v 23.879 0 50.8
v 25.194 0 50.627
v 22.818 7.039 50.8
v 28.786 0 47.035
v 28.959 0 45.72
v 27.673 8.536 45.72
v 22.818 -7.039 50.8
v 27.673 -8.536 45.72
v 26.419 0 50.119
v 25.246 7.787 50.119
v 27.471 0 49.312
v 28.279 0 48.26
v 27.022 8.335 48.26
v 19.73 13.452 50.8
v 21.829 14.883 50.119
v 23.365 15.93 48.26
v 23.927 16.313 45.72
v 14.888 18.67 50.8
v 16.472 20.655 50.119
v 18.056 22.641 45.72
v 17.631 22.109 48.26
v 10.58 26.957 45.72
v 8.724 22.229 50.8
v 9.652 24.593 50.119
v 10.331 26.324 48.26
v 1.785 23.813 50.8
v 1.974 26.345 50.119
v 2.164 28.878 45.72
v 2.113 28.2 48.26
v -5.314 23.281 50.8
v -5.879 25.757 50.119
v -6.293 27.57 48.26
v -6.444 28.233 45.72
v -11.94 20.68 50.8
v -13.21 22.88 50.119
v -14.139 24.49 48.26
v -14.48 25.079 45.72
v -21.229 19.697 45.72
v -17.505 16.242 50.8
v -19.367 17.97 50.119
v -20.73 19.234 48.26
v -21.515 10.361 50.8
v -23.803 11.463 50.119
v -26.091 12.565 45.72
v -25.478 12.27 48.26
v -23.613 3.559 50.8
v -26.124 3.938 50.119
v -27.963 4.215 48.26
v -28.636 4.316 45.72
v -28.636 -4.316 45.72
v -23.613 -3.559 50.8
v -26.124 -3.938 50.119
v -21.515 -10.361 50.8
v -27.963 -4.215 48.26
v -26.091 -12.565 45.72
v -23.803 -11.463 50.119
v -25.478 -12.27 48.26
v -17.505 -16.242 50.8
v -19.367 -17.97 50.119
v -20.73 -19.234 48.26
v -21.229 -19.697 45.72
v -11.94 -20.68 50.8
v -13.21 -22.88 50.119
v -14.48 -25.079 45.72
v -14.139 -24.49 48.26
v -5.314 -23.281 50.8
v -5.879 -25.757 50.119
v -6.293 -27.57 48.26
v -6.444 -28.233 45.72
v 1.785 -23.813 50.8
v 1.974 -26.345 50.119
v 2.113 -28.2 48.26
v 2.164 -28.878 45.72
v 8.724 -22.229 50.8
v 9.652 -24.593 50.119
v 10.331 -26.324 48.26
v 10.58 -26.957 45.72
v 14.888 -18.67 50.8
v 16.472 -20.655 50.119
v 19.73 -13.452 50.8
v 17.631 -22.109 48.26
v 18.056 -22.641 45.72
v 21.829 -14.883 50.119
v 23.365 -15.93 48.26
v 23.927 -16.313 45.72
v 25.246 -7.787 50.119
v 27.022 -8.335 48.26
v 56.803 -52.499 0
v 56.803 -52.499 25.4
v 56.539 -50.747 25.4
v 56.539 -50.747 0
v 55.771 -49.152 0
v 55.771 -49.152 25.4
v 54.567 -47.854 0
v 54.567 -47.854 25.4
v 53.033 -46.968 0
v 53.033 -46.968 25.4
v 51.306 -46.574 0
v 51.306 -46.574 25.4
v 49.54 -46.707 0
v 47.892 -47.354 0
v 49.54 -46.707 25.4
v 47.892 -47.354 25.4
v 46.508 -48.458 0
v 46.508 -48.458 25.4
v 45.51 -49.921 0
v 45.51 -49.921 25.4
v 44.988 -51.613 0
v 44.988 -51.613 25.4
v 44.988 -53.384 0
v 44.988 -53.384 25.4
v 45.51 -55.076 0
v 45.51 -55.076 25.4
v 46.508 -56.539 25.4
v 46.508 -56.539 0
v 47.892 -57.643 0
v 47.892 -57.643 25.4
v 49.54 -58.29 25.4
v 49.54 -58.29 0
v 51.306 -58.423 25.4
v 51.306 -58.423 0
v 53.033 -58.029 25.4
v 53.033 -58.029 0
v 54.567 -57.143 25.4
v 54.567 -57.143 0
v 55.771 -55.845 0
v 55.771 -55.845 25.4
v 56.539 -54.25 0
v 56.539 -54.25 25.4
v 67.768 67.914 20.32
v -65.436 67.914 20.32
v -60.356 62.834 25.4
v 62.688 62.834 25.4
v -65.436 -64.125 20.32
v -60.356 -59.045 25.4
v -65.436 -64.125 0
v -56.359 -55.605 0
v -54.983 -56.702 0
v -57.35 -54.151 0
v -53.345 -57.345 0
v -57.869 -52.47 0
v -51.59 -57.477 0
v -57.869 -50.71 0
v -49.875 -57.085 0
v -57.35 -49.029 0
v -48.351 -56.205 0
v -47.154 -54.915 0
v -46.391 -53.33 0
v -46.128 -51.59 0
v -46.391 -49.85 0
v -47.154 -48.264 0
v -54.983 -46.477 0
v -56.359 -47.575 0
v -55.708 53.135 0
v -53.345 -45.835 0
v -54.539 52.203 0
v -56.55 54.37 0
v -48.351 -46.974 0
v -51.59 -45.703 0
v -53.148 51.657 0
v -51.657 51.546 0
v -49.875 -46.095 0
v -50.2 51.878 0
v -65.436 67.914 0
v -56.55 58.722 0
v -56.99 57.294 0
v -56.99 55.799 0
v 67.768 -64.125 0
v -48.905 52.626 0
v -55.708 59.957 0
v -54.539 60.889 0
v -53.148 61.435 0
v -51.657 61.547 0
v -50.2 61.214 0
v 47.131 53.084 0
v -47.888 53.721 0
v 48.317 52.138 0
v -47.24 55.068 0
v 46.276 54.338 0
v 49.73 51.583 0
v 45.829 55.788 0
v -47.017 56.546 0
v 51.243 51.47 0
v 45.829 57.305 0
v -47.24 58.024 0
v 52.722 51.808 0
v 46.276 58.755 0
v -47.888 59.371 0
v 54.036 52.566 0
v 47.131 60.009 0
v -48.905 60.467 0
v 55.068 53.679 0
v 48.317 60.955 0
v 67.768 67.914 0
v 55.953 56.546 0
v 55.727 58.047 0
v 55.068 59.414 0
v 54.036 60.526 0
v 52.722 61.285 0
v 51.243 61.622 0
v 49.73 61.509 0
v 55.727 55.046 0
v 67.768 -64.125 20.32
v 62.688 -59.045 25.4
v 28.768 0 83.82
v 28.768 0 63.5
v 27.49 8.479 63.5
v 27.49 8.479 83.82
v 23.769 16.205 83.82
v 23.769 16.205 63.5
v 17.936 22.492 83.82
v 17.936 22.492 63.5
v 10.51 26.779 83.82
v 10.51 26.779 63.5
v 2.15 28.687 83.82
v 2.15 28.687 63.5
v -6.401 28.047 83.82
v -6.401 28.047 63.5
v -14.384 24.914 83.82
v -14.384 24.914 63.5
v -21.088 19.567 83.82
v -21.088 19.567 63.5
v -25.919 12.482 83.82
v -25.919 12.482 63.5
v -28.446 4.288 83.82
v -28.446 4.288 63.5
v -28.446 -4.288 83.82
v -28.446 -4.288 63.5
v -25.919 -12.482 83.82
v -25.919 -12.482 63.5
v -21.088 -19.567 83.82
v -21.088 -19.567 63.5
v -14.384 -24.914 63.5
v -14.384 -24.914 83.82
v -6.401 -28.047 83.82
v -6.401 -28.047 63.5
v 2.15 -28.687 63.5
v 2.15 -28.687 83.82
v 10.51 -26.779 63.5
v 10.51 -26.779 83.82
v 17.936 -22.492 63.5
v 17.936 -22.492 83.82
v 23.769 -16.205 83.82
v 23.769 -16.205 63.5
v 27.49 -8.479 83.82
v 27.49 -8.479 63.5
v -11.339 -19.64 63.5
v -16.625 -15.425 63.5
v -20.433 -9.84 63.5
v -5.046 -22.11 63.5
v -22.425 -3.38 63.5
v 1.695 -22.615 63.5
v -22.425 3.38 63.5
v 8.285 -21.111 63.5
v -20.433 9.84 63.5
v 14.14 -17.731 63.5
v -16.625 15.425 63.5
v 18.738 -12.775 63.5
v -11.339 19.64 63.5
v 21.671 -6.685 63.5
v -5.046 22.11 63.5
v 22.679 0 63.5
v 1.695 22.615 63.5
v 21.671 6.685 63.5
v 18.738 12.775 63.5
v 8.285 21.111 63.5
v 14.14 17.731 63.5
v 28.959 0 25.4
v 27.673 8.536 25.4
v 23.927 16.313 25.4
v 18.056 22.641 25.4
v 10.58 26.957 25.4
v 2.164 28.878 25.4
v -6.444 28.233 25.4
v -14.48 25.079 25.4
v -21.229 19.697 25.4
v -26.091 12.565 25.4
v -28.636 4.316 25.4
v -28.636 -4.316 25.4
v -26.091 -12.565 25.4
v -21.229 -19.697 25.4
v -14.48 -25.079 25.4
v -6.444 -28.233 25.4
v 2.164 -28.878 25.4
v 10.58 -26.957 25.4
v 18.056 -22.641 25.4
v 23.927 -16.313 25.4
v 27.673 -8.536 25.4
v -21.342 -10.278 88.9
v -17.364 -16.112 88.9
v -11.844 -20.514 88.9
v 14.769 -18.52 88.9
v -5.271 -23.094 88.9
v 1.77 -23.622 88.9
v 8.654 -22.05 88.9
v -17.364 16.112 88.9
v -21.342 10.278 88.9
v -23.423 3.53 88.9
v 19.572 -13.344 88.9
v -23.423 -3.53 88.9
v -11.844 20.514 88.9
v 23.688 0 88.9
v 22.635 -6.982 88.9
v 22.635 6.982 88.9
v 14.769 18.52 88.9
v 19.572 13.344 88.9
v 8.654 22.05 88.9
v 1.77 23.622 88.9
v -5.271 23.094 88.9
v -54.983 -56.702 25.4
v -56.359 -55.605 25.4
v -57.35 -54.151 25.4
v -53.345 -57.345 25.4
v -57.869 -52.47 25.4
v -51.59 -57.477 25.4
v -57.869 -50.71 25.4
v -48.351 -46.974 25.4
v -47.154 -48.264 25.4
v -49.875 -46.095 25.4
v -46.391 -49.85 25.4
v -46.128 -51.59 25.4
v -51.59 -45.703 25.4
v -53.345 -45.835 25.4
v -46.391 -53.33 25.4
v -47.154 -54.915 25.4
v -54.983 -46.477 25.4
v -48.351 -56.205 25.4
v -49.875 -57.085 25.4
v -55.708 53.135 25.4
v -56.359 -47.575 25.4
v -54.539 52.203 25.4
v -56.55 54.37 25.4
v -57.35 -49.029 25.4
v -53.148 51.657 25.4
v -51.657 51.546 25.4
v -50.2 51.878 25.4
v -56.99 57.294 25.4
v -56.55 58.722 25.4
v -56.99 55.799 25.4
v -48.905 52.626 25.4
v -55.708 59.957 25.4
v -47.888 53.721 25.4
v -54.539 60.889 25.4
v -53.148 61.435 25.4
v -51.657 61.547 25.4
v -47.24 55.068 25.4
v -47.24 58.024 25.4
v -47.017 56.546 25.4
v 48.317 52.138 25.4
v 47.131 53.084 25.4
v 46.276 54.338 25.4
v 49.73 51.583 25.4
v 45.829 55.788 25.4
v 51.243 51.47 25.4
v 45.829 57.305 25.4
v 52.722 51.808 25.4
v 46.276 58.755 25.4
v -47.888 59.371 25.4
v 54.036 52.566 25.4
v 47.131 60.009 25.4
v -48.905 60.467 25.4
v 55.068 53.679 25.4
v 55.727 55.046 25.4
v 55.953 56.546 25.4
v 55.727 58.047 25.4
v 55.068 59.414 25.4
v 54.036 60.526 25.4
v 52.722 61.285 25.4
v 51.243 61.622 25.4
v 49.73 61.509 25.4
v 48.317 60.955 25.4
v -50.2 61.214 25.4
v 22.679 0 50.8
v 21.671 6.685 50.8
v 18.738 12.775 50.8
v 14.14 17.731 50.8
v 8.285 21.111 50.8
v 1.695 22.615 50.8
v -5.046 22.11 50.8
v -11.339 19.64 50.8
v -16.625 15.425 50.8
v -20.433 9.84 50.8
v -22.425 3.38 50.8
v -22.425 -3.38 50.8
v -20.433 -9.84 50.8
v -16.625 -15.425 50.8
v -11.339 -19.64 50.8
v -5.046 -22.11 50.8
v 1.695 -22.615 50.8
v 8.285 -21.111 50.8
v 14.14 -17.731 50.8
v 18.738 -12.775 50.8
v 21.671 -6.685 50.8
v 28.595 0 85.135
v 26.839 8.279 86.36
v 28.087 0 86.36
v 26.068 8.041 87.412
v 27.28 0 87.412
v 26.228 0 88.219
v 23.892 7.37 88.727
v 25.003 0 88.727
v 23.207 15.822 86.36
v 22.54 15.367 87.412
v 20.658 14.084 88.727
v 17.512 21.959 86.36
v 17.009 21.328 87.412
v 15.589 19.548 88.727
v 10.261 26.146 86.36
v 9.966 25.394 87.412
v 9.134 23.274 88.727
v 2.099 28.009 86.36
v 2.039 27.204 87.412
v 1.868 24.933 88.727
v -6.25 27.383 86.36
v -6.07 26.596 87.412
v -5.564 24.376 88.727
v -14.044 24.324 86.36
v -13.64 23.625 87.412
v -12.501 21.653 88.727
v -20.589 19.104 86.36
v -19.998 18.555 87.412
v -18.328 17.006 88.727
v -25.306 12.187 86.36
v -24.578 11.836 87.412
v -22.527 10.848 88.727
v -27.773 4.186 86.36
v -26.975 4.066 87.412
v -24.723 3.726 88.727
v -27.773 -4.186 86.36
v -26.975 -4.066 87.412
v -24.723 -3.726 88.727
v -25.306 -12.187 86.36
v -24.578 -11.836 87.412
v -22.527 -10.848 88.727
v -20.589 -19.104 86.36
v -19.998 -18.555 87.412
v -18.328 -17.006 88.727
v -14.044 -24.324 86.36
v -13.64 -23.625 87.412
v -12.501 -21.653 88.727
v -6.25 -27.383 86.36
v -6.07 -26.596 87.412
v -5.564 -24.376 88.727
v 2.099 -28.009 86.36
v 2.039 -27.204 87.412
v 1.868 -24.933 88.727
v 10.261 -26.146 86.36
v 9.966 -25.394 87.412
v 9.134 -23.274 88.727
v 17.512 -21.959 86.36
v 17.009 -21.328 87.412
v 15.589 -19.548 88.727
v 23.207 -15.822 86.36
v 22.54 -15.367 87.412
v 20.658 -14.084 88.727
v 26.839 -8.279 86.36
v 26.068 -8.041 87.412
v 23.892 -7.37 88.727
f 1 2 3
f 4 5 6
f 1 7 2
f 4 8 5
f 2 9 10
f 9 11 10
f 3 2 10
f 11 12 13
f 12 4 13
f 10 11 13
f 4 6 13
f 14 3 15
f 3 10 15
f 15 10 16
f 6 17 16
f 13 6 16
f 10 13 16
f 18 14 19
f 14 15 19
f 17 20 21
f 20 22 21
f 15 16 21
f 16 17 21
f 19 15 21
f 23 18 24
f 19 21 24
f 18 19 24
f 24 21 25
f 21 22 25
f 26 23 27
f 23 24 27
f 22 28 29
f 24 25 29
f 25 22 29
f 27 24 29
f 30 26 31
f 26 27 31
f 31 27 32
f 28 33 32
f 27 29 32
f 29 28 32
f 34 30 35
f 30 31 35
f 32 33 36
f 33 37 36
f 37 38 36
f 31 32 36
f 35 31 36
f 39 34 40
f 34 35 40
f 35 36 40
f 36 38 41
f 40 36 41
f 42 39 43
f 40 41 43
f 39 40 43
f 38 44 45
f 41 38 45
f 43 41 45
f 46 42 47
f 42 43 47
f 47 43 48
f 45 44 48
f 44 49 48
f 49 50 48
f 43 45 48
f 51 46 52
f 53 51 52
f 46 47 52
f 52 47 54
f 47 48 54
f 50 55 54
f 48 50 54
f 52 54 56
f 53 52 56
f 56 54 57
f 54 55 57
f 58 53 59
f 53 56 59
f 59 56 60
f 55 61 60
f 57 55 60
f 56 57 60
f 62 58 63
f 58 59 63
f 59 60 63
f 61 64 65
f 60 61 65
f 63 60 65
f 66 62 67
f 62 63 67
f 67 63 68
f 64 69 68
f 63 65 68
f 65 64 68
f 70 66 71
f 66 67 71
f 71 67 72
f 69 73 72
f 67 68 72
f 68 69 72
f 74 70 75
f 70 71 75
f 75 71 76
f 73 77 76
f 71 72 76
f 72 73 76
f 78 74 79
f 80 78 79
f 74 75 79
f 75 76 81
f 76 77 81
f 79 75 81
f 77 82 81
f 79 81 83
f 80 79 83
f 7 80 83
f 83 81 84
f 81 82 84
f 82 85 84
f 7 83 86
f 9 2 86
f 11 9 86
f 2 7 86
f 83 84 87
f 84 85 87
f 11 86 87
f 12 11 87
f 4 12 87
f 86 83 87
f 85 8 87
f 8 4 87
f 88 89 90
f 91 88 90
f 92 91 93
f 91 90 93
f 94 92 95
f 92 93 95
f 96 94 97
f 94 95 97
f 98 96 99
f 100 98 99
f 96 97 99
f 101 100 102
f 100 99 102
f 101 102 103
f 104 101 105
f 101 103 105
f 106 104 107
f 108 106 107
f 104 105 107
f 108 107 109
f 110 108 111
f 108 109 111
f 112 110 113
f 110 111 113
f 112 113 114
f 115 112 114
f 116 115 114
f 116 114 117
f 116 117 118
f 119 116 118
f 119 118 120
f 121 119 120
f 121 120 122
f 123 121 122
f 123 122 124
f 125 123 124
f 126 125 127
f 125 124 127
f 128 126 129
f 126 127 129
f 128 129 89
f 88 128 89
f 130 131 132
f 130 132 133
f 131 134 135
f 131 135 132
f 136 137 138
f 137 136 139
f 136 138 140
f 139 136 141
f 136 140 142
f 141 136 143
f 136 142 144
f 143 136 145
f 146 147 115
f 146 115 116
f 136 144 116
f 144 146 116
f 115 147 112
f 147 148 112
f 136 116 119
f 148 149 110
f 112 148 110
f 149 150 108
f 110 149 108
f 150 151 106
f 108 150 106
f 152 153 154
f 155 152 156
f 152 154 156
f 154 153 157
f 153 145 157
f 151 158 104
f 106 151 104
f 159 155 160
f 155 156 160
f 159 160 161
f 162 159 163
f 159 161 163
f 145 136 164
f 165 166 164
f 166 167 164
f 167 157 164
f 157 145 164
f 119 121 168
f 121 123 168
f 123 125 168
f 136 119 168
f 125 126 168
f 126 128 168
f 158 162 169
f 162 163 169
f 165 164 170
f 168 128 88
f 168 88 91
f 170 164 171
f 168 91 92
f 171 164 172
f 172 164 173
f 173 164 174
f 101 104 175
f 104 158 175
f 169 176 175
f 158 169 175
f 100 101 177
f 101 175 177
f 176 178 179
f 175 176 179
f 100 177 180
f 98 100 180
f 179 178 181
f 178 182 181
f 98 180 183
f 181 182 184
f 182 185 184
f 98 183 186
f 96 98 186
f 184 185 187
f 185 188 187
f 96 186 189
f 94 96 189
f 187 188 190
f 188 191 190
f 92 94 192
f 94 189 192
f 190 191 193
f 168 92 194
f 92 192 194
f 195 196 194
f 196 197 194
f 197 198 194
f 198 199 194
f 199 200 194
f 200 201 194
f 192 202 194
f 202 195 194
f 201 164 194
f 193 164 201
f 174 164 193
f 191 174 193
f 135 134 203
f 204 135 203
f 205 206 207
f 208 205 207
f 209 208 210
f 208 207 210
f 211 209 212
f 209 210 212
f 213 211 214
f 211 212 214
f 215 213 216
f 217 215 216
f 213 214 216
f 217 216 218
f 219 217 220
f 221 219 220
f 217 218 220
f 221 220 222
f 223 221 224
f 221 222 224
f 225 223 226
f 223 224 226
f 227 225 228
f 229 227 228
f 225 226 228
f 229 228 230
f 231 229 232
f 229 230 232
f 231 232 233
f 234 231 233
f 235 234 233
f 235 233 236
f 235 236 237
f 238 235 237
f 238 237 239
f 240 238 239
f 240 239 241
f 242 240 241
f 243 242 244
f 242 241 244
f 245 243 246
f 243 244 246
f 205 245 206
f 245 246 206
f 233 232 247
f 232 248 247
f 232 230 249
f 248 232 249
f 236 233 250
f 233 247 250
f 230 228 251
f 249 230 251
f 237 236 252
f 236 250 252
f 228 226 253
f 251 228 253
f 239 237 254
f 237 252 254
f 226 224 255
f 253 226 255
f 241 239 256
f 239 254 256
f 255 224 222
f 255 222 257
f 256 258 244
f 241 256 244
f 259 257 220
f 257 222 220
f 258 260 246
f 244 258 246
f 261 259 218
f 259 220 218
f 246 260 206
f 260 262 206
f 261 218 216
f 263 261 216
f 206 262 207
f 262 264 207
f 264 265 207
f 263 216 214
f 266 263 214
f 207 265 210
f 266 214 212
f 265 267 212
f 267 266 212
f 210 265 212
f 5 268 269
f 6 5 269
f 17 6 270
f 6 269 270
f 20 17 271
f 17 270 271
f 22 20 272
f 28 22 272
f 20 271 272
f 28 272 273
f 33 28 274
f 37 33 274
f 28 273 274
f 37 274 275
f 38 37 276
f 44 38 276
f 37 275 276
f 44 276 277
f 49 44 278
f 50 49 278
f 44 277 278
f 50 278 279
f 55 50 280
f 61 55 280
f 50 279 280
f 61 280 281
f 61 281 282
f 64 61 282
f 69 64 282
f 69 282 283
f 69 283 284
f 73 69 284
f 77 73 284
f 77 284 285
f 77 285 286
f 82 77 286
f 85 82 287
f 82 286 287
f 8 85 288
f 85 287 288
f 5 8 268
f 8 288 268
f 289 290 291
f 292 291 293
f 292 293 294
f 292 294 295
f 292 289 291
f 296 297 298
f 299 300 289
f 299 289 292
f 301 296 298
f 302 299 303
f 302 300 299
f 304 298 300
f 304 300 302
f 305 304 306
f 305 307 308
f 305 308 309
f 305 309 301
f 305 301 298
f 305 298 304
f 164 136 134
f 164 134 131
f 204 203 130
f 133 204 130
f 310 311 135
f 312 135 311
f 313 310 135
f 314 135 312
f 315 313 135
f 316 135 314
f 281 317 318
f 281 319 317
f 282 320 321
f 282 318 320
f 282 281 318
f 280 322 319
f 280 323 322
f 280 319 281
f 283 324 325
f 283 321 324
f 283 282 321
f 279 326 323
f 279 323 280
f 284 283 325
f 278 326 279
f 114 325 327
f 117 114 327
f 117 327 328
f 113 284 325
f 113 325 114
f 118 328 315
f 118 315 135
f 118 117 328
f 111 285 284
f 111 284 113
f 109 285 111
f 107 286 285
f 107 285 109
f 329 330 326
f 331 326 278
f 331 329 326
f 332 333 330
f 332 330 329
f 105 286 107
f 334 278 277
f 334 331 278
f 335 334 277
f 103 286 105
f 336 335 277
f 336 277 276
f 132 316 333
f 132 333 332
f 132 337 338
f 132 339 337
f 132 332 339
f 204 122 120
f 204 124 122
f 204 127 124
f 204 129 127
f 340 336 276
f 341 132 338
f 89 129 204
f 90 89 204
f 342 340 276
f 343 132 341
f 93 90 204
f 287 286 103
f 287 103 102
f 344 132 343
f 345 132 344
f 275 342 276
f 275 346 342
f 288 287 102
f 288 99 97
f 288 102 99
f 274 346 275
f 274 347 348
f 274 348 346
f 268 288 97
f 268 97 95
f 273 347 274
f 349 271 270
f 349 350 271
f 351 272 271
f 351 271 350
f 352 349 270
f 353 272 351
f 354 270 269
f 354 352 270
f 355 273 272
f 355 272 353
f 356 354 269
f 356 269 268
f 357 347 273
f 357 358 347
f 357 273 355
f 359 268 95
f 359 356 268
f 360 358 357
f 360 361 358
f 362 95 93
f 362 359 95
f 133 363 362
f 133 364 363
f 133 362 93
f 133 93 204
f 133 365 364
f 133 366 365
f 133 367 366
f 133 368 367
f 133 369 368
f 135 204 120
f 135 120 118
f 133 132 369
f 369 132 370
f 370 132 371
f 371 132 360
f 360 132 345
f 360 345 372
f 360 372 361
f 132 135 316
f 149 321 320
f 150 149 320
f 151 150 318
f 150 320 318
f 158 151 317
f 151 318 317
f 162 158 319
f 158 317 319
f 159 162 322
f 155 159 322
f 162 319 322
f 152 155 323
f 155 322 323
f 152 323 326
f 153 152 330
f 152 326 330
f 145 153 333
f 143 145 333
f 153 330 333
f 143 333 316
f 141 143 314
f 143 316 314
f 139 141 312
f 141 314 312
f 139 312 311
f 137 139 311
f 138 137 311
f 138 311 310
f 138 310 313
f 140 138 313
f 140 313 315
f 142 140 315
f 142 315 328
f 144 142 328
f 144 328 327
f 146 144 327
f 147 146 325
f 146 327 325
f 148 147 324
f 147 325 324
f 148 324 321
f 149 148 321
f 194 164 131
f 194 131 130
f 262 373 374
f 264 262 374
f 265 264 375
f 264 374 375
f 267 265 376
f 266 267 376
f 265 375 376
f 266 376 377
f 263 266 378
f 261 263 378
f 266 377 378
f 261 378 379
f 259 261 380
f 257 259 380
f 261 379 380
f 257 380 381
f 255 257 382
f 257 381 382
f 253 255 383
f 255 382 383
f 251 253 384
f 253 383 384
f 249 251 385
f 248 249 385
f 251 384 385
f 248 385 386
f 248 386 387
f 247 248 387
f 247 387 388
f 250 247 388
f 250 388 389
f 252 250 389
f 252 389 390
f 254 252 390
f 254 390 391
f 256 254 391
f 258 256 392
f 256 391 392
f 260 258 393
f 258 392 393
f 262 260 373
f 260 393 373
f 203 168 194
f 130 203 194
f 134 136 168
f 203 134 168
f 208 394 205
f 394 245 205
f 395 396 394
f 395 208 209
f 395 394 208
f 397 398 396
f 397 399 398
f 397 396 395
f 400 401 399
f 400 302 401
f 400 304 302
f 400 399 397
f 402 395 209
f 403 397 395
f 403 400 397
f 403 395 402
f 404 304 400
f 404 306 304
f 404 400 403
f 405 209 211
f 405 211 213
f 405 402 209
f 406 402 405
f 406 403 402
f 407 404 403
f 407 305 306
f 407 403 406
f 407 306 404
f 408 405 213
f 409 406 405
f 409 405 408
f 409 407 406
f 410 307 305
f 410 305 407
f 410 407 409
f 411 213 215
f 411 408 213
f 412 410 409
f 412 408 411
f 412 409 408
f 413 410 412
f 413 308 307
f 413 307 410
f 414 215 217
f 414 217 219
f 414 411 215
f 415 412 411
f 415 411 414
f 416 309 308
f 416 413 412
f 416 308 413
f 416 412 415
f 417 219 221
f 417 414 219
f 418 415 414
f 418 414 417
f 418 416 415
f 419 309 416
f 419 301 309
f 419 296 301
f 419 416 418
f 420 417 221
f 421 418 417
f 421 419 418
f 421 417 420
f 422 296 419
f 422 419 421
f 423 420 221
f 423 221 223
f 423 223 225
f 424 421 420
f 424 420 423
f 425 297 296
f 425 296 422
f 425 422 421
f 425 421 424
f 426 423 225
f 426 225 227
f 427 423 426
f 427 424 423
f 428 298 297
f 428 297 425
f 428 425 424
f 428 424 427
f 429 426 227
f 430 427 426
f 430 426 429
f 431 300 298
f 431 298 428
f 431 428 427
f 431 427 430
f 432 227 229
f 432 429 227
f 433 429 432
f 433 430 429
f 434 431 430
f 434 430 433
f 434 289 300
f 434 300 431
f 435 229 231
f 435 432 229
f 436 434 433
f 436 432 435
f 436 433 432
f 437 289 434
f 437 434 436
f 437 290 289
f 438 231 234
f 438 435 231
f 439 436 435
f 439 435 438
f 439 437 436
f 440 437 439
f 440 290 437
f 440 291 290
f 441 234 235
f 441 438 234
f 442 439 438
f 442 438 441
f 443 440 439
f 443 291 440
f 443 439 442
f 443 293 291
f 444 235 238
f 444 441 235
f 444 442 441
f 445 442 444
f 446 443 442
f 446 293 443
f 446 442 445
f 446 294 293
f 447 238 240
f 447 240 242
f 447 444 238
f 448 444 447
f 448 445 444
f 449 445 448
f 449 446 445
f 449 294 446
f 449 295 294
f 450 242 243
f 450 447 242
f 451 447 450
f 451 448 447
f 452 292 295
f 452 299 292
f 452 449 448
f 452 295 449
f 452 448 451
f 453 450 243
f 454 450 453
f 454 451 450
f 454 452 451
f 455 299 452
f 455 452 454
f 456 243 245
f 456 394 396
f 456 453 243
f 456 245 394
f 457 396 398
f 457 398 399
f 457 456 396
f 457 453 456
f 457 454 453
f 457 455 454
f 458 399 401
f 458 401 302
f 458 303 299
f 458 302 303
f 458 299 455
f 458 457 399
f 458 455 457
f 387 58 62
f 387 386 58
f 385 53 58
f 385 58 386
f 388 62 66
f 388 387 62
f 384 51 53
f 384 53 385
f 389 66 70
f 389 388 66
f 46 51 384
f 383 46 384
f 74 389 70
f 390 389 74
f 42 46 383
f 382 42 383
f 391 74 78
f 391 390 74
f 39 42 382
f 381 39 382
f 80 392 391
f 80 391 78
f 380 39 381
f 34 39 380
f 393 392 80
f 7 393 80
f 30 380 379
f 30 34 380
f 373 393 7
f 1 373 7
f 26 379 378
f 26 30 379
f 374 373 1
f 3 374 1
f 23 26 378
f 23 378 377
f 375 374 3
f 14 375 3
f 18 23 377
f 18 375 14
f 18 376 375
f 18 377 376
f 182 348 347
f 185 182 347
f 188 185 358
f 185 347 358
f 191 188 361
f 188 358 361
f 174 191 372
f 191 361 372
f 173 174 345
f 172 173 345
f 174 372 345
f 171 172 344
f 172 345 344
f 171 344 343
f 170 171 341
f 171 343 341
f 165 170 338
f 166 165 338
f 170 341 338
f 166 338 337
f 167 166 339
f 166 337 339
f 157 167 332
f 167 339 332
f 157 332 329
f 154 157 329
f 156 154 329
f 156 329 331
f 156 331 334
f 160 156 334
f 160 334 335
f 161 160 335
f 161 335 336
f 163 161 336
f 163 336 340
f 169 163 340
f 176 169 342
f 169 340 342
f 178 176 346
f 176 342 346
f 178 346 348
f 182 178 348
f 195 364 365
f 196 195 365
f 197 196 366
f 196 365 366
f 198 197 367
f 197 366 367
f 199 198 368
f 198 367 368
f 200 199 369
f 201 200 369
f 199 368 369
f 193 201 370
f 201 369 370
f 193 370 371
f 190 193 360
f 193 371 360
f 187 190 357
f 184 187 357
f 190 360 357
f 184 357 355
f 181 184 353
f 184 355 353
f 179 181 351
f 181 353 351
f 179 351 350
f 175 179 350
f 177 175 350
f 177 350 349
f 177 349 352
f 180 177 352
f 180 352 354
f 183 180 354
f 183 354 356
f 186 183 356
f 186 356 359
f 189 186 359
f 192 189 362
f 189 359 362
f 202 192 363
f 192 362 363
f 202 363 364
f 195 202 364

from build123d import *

# Parameters (mm, degrees)
F0_W      = 133.204266
F0_H      = 132.038363
F1_DEPTH  = 25.4
F2_R      = 5.014733
F2_R_2    = 5.090399
F2_R_3    = 5.903397
F2_R_4    = 5.940857
F4_DEPTH  = 25.4
F5_DEPTH  = 25.4
F3_R      = 28.959294
F6_DEPTH  = 25.4
F7_R      = 22.678724
F8_DEPTH  = 12.7
F9_R      = 28.767789
F10_DEPTH = 25.4
F11_R     = 5.08
F12_SIZE  = 5.08


with BuildPart() as f1:
    # F0 (on Top) → F1 (new body)
    with BuildSketch(Plane.XY):
        with Locations((1.165904, 1.89459)):
            Rectangle(F0_W, F0_H)
    extrude(amount=F1_DEPTH)

    # F2 (on face) → F4 (cut)
    with BuildSketch(Plane.XY.offset(25.4)):
        with Locations((-52.031644, 56.54623)):
            Circle(F2_R)
        with Locations((50.862458, 56.54623)):
            Circle(F2_R_2)
        with Locations((-52.031644, -51.589914)):
            Circle(F2_R_3)
        with Locations((50.862458, -52.49856)):
            Circle(F2_R_4)
    extrude(amount=-F4_DEPTH, mode=Mode.SUBTRACT)

    # F2 (on face) → F5 (cut)
    with BuildSketch(Plane.XY.offset(25.4)):
        with Locations((-52.031644, 56.54623)):
            Circle(F2_R)
        with Locations((50.862458, 56.54623)):
            Circle(F2_R_2)
        with Locations((-52.031644, -51.589914)):
            Circle(F2_R_3)
        with Locations((50.862458, -52.49856)):
            Circle(F2_R_4)
    extrude(amount=-F5_DEPTH, mode=Mode.SUBTRACT)

    # F3 (on face) → F6 (join)
    with BuildSketch(Plane.XY.offset(25.4)):
        Circle(F3_R)
    extrude(amount=F6_DEPTH)

    # F7 (on face) → F8 (join)
    with BuildSketch(Plane.XY.offset(50.8)):
        Circle(F7_R)
    extrude(amount=F8_DEPTH)

    # F9 (on face) → F10 (join)
    with BuildSketch(Plane.XY.offset(63.5)):
        Circle(F9_R)
    extrude(amount=F10_DEPTH)

    # F11
    f11_edges = [f1.edges().sort_by_distance(p)[0] for p in [
        (-28.959294, 0, 50.8),
        (-28.767789, 0, 88.9),
    ]]
    fillet(f11_edges, radius=F11_R)

    # F12
    f12_edges = [f1.edges().sort_by_distance(p)[0] for p in [
        (1.165904, -64.124592, 25.4),
        (-65.436229, 1.89459, 25.4),
        (1.165904, 67.913771, 25.4),
        (67.768037, 1.89459, 25.4),
    ]]
    chamfer(f12_edges, length=F12_SIZE)


solid = f1.part
